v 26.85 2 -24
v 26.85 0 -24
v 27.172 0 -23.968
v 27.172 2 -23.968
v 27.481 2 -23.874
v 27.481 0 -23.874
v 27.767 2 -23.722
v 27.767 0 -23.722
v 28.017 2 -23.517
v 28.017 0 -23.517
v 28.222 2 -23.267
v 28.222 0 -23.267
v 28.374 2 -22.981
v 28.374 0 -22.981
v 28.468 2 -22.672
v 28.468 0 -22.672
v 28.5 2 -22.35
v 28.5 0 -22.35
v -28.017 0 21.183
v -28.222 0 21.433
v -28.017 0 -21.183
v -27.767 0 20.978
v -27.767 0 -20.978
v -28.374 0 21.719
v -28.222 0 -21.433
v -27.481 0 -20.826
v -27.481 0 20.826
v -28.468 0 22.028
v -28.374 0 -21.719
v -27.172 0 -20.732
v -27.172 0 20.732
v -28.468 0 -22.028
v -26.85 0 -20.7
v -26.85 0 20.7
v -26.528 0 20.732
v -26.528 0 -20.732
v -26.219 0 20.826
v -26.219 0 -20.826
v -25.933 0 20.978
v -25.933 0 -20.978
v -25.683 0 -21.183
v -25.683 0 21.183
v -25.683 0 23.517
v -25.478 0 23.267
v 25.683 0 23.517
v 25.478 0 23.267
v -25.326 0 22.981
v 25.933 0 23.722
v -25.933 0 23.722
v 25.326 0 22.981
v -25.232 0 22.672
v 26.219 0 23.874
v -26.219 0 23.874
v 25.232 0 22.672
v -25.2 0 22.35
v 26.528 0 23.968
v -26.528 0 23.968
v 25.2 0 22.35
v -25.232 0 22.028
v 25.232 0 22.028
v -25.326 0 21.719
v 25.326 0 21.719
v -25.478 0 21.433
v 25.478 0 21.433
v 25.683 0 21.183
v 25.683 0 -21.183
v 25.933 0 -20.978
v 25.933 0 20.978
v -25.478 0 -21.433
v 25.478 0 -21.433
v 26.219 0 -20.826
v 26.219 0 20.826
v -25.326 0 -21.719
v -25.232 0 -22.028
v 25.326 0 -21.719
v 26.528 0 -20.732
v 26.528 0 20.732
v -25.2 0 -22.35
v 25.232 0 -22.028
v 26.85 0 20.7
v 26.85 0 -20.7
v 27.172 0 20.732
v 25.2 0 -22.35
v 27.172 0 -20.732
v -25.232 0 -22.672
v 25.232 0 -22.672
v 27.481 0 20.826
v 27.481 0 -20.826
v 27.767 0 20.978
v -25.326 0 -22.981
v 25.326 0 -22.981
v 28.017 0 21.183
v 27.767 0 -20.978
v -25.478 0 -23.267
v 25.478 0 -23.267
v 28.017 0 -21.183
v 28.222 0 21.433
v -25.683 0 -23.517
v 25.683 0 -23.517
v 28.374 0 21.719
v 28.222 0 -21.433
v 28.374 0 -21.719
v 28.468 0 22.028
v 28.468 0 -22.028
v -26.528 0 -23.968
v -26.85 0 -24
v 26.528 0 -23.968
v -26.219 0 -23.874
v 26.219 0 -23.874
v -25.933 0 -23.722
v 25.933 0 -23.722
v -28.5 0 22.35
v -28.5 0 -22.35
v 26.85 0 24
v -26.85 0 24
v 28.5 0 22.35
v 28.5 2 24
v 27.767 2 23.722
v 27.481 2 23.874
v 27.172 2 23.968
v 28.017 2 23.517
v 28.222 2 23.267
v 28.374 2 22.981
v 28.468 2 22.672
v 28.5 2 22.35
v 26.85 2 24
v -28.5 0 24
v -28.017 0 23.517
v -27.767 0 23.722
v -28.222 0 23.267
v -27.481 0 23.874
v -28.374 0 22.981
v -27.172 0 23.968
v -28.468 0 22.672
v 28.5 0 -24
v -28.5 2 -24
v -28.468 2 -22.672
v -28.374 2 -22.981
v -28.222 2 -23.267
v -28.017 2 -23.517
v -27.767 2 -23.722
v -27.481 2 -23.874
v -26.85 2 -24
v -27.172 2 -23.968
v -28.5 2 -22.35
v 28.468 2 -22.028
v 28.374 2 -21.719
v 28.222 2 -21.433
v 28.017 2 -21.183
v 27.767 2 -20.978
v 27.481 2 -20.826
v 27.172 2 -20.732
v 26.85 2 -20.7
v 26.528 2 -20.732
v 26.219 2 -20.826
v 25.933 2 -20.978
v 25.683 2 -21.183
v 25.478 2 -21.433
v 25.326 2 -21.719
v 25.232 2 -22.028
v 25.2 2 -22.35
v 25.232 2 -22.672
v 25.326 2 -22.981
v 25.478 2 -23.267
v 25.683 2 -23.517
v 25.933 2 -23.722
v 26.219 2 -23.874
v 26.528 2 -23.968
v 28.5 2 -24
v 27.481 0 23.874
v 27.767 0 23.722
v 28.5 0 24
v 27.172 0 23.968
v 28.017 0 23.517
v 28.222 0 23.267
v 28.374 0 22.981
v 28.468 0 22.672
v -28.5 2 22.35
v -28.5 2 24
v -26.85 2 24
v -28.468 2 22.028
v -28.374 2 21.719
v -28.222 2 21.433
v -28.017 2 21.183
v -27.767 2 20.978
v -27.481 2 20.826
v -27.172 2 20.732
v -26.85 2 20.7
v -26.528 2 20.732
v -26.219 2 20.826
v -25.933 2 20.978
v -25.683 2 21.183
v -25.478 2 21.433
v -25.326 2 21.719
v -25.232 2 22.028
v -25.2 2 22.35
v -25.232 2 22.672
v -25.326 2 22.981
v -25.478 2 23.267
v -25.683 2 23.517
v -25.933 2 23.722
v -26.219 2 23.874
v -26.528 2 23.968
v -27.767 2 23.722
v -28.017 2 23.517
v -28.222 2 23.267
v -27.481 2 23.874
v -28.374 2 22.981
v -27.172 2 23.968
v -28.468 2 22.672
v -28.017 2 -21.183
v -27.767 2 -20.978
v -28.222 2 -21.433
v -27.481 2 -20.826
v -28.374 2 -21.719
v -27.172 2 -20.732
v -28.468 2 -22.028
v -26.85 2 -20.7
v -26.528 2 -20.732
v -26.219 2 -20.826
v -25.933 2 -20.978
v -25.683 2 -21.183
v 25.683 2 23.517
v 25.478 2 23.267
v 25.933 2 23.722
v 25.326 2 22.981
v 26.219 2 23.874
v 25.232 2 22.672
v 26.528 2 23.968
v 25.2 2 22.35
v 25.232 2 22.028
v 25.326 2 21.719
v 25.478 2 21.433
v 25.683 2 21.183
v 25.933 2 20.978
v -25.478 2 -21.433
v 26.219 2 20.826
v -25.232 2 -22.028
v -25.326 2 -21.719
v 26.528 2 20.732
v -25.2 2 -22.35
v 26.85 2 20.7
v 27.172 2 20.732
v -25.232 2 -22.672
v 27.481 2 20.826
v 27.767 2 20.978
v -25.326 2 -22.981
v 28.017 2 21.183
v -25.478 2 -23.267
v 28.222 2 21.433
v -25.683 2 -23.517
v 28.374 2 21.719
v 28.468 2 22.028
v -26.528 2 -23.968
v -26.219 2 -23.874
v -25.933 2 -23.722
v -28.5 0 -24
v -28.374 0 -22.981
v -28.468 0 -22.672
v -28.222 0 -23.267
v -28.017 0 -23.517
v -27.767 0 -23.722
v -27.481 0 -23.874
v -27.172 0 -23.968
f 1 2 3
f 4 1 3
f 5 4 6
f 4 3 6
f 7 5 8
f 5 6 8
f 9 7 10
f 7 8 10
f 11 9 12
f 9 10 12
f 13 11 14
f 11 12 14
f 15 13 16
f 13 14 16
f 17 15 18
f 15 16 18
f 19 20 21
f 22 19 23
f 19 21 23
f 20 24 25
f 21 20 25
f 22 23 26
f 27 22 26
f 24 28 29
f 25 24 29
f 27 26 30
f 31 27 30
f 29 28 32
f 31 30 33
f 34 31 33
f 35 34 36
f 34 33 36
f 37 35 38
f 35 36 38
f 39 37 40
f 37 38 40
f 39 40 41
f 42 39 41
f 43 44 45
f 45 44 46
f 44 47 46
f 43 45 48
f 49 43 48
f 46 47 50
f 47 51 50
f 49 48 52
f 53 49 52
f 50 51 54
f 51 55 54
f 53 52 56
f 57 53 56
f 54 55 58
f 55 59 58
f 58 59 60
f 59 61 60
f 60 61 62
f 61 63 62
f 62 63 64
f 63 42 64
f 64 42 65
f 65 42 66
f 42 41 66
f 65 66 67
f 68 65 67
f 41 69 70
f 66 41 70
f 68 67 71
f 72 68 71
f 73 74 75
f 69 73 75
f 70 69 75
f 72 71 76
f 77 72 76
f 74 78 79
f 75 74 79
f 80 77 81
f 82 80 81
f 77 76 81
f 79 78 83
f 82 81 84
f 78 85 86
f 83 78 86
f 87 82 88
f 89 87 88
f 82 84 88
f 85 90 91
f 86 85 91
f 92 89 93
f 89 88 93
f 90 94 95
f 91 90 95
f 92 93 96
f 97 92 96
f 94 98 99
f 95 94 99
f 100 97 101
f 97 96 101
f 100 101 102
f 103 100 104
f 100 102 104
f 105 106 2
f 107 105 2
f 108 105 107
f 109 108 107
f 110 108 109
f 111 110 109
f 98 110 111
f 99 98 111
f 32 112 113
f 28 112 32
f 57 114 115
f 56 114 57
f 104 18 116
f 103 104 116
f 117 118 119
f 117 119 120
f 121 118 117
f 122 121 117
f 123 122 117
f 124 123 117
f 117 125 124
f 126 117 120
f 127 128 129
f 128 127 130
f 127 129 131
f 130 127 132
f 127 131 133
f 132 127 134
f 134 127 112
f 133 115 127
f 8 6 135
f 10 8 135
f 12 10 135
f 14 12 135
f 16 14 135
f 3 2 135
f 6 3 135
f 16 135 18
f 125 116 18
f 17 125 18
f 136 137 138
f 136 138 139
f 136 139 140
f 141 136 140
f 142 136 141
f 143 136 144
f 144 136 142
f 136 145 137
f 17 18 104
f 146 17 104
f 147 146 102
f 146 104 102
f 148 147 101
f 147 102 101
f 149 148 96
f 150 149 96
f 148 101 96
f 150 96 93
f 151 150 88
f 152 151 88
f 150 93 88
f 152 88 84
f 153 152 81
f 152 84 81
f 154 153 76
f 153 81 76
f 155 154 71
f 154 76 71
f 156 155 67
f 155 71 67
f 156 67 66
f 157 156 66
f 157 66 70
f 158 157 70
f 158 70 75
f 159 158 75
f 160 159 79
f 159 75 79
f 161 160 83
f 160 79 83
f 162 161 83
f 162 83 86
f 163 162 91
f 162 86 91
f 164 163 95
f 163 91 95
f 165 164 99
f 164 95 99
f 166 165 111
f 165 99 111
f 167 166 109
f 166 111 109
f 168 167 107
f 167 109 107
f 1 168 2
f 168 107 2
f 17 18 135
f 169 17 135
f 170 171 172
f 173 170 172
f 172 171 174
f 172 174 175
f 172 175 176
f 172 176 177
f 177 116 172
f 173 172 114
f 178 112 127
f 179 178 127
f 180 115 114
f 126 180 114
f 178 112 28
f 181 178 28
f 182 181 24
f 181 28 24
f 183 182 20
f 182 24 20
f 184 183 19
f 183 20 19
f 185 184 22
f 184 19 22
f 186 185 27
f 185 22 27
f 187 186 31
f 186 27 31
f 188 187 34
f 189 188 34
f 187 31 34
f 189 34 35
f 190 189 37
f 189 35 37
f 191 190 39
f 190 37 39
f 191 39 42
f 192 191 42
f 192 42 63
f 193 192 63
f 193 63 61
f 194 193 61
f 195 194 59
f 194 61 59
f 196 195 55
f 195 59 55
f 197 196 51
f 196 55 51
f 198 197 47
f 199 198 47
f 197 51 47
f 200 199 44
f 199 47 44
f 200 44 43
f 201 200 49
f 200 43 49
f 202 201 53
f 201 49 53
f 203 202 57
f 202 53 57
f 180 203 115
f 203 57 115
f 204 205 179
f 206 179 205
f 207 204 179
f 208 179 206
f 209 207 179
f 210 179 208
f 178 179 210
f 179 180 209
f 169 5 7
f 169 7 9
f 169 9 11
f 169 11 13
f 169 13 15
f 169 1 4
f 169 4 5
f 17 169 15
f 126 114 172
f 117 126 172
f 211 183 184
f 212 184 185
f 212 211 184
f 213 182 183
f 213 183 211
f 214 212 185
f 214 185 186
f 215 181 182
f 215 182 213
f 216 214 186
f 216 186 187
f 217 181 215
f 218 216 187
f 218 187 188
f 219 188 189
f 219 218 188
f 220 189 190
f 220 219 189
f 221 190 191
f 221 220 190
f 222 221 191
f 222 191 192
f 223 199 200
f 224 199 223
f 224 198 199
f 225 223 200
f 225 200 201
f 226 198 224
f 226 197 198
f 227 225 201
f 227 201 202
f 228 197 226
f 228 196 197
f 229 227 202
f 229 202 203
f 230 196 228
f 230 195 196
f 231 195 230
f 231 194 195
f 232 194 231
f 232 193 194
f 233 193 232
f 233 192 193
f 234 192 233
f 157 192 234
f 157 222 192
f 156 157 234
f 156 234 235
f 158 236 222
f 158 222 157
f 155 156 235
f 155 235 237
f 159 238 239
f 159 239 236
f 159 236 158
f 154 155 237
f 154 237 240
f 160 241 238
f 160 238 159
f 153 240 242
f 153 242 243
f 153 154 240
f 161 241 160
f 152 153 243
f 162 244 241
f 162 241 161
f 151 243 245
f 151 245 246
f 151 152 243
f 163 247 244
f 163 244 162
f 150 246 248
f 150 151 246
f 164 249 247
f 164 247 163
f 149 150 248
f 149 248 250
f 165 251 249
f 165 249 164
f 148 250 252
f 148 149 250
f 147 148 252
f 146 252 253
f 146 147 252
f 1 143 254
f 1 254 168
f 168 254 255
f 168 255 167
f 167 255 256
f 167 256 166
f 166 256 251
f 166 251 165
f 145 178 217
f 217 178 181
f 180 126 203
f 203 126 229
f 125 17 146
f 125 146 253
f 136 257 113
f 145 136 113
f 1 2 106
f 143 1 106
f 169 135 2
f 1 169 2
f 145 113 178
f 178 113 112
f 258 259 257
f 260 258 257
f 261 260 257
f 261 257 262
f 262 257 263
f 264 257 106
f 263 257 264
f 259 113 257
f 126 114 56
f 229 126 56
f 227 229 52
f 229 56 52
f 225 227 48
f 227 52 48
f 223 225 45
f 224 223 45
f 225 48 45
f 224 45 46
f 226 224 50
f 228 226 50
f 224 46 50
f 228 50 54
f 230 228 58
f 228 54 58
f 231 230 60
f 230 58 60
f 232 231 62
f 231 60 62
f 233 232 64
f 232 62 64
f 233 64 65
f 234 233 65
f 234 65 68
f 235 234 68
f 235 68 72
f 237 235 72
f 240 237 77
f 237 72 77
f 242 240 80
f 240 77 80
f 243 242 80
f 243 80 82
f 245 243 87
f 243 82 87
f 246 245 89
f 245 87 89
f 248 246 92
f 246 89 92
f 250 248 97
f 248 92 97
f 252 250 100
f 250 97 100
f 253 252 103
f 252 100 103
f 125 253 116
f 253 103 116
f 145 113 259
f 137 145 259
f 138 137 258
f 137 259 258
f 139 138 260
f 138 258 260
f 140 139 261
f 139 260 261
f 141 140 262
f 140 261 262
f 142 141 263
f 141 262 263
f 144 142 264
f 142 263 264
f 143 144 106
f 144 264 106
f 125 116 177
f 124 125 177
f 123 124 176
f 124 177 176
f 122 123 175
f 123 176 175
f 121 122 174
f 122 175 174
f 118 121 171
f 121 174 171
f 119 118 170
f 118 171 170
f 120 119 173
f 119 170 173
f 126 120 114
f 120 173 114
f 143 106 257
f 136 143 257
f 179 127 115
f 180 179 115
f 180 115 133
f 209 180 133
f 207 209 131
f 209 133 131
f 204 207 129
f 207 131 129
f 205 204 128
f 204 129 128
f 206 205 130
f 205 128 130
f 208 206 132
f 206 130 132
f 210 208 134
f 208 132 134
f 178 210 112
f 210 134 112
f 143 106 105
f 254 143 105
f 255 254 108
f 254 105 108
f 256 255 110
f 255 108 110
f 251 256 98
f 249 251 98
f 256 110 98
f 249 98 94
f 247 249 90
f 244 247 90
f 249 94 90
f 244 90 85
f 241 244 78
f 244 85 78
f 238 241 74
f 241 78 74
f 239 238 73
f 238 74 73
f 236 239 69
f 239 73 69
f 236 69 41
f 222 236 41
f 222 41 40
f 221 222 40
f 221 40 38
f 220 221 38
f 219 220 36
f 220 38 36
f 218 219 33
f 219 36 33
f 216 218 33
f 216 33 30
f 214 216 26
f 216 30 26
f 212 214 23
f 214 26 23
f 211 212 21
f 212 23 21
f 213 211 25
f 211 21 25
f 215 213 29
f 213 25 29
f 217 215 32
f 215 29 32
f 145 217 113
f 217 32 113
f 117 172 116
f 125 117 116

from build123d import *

# Parameters (mm, degrees)
BOSS_EXTRUDE1_DEPTH = 2


with BuildPart() as part:
    # Sketch1 → Boss-Extrude1 (new body)
    with BuildSketch(Plane(origin=(0, 0, 0), x_dir=(1, 0, 0), z_dir=(0, 1, 0))):
        with BuildLine():
            Line((-26.85, 24), (-28.5, 24))
            Line((-28.5, 24), (-28.5, 22.35))
            ThreePointArc((-28.5, 22.35), (-28.016726189, 23.516726189), (-26.85, 24))
        make_face()
        with BuildLine():
            Line((26.85, 24), (-26.85, 24))
            ThreePointArc((-26.85, 24), (-25.683273811, 21.183273811), (-28.5, 22.35))
            Line((-28.5, 22.35), (-28.5, -22.349999993))
            ThreePointArc((-28.5, -22.349999993), (-25.683273809, -21.183273813), (-26.85, -24))
            Line((-26.85, -24), (26.85, -24))
            ThreePointArc((26.85, -24), (25.683273811, -21.183273811), (28.5, -22.35))
            Line((28.5, -22.35), (28.5, 22.35))
            ThreePointArc((28.5, 22.35), (25.683273811, 21.183273811), (26.85, 24))
        make_face()
        with BuildLine():
            Line((28.5, 24), (26.85, 24))
            ThreePointArc((26.85, 24), (28.016726189, 23.516726189), (28.5, 22.35))
            Line((28.5, 22.35), (28.5, 24))
        make_face()
        with BuildLine():
            ThreePointArc((-26.85, -24), (-28.016726191, -23.516726187), (-28.5, -22.349999993))
            Line((-28.5, -22.349999993), (-28.5, -24))
            Line((-28.5, -24), (-26.85, -24))
        make_face()
        with BuildLine():
            Line((28.5, -24), (28.5, -22.35))
            ThreePointArc((28.5, -22.35), (28.016726189, -23.516726189), (26.85, -24))
            Line((26.85, -24), (28.5, -24))
        make_face()
    extrude(amount=BOSS_EXTRUDE1_DEPTH)


solid = part.part
